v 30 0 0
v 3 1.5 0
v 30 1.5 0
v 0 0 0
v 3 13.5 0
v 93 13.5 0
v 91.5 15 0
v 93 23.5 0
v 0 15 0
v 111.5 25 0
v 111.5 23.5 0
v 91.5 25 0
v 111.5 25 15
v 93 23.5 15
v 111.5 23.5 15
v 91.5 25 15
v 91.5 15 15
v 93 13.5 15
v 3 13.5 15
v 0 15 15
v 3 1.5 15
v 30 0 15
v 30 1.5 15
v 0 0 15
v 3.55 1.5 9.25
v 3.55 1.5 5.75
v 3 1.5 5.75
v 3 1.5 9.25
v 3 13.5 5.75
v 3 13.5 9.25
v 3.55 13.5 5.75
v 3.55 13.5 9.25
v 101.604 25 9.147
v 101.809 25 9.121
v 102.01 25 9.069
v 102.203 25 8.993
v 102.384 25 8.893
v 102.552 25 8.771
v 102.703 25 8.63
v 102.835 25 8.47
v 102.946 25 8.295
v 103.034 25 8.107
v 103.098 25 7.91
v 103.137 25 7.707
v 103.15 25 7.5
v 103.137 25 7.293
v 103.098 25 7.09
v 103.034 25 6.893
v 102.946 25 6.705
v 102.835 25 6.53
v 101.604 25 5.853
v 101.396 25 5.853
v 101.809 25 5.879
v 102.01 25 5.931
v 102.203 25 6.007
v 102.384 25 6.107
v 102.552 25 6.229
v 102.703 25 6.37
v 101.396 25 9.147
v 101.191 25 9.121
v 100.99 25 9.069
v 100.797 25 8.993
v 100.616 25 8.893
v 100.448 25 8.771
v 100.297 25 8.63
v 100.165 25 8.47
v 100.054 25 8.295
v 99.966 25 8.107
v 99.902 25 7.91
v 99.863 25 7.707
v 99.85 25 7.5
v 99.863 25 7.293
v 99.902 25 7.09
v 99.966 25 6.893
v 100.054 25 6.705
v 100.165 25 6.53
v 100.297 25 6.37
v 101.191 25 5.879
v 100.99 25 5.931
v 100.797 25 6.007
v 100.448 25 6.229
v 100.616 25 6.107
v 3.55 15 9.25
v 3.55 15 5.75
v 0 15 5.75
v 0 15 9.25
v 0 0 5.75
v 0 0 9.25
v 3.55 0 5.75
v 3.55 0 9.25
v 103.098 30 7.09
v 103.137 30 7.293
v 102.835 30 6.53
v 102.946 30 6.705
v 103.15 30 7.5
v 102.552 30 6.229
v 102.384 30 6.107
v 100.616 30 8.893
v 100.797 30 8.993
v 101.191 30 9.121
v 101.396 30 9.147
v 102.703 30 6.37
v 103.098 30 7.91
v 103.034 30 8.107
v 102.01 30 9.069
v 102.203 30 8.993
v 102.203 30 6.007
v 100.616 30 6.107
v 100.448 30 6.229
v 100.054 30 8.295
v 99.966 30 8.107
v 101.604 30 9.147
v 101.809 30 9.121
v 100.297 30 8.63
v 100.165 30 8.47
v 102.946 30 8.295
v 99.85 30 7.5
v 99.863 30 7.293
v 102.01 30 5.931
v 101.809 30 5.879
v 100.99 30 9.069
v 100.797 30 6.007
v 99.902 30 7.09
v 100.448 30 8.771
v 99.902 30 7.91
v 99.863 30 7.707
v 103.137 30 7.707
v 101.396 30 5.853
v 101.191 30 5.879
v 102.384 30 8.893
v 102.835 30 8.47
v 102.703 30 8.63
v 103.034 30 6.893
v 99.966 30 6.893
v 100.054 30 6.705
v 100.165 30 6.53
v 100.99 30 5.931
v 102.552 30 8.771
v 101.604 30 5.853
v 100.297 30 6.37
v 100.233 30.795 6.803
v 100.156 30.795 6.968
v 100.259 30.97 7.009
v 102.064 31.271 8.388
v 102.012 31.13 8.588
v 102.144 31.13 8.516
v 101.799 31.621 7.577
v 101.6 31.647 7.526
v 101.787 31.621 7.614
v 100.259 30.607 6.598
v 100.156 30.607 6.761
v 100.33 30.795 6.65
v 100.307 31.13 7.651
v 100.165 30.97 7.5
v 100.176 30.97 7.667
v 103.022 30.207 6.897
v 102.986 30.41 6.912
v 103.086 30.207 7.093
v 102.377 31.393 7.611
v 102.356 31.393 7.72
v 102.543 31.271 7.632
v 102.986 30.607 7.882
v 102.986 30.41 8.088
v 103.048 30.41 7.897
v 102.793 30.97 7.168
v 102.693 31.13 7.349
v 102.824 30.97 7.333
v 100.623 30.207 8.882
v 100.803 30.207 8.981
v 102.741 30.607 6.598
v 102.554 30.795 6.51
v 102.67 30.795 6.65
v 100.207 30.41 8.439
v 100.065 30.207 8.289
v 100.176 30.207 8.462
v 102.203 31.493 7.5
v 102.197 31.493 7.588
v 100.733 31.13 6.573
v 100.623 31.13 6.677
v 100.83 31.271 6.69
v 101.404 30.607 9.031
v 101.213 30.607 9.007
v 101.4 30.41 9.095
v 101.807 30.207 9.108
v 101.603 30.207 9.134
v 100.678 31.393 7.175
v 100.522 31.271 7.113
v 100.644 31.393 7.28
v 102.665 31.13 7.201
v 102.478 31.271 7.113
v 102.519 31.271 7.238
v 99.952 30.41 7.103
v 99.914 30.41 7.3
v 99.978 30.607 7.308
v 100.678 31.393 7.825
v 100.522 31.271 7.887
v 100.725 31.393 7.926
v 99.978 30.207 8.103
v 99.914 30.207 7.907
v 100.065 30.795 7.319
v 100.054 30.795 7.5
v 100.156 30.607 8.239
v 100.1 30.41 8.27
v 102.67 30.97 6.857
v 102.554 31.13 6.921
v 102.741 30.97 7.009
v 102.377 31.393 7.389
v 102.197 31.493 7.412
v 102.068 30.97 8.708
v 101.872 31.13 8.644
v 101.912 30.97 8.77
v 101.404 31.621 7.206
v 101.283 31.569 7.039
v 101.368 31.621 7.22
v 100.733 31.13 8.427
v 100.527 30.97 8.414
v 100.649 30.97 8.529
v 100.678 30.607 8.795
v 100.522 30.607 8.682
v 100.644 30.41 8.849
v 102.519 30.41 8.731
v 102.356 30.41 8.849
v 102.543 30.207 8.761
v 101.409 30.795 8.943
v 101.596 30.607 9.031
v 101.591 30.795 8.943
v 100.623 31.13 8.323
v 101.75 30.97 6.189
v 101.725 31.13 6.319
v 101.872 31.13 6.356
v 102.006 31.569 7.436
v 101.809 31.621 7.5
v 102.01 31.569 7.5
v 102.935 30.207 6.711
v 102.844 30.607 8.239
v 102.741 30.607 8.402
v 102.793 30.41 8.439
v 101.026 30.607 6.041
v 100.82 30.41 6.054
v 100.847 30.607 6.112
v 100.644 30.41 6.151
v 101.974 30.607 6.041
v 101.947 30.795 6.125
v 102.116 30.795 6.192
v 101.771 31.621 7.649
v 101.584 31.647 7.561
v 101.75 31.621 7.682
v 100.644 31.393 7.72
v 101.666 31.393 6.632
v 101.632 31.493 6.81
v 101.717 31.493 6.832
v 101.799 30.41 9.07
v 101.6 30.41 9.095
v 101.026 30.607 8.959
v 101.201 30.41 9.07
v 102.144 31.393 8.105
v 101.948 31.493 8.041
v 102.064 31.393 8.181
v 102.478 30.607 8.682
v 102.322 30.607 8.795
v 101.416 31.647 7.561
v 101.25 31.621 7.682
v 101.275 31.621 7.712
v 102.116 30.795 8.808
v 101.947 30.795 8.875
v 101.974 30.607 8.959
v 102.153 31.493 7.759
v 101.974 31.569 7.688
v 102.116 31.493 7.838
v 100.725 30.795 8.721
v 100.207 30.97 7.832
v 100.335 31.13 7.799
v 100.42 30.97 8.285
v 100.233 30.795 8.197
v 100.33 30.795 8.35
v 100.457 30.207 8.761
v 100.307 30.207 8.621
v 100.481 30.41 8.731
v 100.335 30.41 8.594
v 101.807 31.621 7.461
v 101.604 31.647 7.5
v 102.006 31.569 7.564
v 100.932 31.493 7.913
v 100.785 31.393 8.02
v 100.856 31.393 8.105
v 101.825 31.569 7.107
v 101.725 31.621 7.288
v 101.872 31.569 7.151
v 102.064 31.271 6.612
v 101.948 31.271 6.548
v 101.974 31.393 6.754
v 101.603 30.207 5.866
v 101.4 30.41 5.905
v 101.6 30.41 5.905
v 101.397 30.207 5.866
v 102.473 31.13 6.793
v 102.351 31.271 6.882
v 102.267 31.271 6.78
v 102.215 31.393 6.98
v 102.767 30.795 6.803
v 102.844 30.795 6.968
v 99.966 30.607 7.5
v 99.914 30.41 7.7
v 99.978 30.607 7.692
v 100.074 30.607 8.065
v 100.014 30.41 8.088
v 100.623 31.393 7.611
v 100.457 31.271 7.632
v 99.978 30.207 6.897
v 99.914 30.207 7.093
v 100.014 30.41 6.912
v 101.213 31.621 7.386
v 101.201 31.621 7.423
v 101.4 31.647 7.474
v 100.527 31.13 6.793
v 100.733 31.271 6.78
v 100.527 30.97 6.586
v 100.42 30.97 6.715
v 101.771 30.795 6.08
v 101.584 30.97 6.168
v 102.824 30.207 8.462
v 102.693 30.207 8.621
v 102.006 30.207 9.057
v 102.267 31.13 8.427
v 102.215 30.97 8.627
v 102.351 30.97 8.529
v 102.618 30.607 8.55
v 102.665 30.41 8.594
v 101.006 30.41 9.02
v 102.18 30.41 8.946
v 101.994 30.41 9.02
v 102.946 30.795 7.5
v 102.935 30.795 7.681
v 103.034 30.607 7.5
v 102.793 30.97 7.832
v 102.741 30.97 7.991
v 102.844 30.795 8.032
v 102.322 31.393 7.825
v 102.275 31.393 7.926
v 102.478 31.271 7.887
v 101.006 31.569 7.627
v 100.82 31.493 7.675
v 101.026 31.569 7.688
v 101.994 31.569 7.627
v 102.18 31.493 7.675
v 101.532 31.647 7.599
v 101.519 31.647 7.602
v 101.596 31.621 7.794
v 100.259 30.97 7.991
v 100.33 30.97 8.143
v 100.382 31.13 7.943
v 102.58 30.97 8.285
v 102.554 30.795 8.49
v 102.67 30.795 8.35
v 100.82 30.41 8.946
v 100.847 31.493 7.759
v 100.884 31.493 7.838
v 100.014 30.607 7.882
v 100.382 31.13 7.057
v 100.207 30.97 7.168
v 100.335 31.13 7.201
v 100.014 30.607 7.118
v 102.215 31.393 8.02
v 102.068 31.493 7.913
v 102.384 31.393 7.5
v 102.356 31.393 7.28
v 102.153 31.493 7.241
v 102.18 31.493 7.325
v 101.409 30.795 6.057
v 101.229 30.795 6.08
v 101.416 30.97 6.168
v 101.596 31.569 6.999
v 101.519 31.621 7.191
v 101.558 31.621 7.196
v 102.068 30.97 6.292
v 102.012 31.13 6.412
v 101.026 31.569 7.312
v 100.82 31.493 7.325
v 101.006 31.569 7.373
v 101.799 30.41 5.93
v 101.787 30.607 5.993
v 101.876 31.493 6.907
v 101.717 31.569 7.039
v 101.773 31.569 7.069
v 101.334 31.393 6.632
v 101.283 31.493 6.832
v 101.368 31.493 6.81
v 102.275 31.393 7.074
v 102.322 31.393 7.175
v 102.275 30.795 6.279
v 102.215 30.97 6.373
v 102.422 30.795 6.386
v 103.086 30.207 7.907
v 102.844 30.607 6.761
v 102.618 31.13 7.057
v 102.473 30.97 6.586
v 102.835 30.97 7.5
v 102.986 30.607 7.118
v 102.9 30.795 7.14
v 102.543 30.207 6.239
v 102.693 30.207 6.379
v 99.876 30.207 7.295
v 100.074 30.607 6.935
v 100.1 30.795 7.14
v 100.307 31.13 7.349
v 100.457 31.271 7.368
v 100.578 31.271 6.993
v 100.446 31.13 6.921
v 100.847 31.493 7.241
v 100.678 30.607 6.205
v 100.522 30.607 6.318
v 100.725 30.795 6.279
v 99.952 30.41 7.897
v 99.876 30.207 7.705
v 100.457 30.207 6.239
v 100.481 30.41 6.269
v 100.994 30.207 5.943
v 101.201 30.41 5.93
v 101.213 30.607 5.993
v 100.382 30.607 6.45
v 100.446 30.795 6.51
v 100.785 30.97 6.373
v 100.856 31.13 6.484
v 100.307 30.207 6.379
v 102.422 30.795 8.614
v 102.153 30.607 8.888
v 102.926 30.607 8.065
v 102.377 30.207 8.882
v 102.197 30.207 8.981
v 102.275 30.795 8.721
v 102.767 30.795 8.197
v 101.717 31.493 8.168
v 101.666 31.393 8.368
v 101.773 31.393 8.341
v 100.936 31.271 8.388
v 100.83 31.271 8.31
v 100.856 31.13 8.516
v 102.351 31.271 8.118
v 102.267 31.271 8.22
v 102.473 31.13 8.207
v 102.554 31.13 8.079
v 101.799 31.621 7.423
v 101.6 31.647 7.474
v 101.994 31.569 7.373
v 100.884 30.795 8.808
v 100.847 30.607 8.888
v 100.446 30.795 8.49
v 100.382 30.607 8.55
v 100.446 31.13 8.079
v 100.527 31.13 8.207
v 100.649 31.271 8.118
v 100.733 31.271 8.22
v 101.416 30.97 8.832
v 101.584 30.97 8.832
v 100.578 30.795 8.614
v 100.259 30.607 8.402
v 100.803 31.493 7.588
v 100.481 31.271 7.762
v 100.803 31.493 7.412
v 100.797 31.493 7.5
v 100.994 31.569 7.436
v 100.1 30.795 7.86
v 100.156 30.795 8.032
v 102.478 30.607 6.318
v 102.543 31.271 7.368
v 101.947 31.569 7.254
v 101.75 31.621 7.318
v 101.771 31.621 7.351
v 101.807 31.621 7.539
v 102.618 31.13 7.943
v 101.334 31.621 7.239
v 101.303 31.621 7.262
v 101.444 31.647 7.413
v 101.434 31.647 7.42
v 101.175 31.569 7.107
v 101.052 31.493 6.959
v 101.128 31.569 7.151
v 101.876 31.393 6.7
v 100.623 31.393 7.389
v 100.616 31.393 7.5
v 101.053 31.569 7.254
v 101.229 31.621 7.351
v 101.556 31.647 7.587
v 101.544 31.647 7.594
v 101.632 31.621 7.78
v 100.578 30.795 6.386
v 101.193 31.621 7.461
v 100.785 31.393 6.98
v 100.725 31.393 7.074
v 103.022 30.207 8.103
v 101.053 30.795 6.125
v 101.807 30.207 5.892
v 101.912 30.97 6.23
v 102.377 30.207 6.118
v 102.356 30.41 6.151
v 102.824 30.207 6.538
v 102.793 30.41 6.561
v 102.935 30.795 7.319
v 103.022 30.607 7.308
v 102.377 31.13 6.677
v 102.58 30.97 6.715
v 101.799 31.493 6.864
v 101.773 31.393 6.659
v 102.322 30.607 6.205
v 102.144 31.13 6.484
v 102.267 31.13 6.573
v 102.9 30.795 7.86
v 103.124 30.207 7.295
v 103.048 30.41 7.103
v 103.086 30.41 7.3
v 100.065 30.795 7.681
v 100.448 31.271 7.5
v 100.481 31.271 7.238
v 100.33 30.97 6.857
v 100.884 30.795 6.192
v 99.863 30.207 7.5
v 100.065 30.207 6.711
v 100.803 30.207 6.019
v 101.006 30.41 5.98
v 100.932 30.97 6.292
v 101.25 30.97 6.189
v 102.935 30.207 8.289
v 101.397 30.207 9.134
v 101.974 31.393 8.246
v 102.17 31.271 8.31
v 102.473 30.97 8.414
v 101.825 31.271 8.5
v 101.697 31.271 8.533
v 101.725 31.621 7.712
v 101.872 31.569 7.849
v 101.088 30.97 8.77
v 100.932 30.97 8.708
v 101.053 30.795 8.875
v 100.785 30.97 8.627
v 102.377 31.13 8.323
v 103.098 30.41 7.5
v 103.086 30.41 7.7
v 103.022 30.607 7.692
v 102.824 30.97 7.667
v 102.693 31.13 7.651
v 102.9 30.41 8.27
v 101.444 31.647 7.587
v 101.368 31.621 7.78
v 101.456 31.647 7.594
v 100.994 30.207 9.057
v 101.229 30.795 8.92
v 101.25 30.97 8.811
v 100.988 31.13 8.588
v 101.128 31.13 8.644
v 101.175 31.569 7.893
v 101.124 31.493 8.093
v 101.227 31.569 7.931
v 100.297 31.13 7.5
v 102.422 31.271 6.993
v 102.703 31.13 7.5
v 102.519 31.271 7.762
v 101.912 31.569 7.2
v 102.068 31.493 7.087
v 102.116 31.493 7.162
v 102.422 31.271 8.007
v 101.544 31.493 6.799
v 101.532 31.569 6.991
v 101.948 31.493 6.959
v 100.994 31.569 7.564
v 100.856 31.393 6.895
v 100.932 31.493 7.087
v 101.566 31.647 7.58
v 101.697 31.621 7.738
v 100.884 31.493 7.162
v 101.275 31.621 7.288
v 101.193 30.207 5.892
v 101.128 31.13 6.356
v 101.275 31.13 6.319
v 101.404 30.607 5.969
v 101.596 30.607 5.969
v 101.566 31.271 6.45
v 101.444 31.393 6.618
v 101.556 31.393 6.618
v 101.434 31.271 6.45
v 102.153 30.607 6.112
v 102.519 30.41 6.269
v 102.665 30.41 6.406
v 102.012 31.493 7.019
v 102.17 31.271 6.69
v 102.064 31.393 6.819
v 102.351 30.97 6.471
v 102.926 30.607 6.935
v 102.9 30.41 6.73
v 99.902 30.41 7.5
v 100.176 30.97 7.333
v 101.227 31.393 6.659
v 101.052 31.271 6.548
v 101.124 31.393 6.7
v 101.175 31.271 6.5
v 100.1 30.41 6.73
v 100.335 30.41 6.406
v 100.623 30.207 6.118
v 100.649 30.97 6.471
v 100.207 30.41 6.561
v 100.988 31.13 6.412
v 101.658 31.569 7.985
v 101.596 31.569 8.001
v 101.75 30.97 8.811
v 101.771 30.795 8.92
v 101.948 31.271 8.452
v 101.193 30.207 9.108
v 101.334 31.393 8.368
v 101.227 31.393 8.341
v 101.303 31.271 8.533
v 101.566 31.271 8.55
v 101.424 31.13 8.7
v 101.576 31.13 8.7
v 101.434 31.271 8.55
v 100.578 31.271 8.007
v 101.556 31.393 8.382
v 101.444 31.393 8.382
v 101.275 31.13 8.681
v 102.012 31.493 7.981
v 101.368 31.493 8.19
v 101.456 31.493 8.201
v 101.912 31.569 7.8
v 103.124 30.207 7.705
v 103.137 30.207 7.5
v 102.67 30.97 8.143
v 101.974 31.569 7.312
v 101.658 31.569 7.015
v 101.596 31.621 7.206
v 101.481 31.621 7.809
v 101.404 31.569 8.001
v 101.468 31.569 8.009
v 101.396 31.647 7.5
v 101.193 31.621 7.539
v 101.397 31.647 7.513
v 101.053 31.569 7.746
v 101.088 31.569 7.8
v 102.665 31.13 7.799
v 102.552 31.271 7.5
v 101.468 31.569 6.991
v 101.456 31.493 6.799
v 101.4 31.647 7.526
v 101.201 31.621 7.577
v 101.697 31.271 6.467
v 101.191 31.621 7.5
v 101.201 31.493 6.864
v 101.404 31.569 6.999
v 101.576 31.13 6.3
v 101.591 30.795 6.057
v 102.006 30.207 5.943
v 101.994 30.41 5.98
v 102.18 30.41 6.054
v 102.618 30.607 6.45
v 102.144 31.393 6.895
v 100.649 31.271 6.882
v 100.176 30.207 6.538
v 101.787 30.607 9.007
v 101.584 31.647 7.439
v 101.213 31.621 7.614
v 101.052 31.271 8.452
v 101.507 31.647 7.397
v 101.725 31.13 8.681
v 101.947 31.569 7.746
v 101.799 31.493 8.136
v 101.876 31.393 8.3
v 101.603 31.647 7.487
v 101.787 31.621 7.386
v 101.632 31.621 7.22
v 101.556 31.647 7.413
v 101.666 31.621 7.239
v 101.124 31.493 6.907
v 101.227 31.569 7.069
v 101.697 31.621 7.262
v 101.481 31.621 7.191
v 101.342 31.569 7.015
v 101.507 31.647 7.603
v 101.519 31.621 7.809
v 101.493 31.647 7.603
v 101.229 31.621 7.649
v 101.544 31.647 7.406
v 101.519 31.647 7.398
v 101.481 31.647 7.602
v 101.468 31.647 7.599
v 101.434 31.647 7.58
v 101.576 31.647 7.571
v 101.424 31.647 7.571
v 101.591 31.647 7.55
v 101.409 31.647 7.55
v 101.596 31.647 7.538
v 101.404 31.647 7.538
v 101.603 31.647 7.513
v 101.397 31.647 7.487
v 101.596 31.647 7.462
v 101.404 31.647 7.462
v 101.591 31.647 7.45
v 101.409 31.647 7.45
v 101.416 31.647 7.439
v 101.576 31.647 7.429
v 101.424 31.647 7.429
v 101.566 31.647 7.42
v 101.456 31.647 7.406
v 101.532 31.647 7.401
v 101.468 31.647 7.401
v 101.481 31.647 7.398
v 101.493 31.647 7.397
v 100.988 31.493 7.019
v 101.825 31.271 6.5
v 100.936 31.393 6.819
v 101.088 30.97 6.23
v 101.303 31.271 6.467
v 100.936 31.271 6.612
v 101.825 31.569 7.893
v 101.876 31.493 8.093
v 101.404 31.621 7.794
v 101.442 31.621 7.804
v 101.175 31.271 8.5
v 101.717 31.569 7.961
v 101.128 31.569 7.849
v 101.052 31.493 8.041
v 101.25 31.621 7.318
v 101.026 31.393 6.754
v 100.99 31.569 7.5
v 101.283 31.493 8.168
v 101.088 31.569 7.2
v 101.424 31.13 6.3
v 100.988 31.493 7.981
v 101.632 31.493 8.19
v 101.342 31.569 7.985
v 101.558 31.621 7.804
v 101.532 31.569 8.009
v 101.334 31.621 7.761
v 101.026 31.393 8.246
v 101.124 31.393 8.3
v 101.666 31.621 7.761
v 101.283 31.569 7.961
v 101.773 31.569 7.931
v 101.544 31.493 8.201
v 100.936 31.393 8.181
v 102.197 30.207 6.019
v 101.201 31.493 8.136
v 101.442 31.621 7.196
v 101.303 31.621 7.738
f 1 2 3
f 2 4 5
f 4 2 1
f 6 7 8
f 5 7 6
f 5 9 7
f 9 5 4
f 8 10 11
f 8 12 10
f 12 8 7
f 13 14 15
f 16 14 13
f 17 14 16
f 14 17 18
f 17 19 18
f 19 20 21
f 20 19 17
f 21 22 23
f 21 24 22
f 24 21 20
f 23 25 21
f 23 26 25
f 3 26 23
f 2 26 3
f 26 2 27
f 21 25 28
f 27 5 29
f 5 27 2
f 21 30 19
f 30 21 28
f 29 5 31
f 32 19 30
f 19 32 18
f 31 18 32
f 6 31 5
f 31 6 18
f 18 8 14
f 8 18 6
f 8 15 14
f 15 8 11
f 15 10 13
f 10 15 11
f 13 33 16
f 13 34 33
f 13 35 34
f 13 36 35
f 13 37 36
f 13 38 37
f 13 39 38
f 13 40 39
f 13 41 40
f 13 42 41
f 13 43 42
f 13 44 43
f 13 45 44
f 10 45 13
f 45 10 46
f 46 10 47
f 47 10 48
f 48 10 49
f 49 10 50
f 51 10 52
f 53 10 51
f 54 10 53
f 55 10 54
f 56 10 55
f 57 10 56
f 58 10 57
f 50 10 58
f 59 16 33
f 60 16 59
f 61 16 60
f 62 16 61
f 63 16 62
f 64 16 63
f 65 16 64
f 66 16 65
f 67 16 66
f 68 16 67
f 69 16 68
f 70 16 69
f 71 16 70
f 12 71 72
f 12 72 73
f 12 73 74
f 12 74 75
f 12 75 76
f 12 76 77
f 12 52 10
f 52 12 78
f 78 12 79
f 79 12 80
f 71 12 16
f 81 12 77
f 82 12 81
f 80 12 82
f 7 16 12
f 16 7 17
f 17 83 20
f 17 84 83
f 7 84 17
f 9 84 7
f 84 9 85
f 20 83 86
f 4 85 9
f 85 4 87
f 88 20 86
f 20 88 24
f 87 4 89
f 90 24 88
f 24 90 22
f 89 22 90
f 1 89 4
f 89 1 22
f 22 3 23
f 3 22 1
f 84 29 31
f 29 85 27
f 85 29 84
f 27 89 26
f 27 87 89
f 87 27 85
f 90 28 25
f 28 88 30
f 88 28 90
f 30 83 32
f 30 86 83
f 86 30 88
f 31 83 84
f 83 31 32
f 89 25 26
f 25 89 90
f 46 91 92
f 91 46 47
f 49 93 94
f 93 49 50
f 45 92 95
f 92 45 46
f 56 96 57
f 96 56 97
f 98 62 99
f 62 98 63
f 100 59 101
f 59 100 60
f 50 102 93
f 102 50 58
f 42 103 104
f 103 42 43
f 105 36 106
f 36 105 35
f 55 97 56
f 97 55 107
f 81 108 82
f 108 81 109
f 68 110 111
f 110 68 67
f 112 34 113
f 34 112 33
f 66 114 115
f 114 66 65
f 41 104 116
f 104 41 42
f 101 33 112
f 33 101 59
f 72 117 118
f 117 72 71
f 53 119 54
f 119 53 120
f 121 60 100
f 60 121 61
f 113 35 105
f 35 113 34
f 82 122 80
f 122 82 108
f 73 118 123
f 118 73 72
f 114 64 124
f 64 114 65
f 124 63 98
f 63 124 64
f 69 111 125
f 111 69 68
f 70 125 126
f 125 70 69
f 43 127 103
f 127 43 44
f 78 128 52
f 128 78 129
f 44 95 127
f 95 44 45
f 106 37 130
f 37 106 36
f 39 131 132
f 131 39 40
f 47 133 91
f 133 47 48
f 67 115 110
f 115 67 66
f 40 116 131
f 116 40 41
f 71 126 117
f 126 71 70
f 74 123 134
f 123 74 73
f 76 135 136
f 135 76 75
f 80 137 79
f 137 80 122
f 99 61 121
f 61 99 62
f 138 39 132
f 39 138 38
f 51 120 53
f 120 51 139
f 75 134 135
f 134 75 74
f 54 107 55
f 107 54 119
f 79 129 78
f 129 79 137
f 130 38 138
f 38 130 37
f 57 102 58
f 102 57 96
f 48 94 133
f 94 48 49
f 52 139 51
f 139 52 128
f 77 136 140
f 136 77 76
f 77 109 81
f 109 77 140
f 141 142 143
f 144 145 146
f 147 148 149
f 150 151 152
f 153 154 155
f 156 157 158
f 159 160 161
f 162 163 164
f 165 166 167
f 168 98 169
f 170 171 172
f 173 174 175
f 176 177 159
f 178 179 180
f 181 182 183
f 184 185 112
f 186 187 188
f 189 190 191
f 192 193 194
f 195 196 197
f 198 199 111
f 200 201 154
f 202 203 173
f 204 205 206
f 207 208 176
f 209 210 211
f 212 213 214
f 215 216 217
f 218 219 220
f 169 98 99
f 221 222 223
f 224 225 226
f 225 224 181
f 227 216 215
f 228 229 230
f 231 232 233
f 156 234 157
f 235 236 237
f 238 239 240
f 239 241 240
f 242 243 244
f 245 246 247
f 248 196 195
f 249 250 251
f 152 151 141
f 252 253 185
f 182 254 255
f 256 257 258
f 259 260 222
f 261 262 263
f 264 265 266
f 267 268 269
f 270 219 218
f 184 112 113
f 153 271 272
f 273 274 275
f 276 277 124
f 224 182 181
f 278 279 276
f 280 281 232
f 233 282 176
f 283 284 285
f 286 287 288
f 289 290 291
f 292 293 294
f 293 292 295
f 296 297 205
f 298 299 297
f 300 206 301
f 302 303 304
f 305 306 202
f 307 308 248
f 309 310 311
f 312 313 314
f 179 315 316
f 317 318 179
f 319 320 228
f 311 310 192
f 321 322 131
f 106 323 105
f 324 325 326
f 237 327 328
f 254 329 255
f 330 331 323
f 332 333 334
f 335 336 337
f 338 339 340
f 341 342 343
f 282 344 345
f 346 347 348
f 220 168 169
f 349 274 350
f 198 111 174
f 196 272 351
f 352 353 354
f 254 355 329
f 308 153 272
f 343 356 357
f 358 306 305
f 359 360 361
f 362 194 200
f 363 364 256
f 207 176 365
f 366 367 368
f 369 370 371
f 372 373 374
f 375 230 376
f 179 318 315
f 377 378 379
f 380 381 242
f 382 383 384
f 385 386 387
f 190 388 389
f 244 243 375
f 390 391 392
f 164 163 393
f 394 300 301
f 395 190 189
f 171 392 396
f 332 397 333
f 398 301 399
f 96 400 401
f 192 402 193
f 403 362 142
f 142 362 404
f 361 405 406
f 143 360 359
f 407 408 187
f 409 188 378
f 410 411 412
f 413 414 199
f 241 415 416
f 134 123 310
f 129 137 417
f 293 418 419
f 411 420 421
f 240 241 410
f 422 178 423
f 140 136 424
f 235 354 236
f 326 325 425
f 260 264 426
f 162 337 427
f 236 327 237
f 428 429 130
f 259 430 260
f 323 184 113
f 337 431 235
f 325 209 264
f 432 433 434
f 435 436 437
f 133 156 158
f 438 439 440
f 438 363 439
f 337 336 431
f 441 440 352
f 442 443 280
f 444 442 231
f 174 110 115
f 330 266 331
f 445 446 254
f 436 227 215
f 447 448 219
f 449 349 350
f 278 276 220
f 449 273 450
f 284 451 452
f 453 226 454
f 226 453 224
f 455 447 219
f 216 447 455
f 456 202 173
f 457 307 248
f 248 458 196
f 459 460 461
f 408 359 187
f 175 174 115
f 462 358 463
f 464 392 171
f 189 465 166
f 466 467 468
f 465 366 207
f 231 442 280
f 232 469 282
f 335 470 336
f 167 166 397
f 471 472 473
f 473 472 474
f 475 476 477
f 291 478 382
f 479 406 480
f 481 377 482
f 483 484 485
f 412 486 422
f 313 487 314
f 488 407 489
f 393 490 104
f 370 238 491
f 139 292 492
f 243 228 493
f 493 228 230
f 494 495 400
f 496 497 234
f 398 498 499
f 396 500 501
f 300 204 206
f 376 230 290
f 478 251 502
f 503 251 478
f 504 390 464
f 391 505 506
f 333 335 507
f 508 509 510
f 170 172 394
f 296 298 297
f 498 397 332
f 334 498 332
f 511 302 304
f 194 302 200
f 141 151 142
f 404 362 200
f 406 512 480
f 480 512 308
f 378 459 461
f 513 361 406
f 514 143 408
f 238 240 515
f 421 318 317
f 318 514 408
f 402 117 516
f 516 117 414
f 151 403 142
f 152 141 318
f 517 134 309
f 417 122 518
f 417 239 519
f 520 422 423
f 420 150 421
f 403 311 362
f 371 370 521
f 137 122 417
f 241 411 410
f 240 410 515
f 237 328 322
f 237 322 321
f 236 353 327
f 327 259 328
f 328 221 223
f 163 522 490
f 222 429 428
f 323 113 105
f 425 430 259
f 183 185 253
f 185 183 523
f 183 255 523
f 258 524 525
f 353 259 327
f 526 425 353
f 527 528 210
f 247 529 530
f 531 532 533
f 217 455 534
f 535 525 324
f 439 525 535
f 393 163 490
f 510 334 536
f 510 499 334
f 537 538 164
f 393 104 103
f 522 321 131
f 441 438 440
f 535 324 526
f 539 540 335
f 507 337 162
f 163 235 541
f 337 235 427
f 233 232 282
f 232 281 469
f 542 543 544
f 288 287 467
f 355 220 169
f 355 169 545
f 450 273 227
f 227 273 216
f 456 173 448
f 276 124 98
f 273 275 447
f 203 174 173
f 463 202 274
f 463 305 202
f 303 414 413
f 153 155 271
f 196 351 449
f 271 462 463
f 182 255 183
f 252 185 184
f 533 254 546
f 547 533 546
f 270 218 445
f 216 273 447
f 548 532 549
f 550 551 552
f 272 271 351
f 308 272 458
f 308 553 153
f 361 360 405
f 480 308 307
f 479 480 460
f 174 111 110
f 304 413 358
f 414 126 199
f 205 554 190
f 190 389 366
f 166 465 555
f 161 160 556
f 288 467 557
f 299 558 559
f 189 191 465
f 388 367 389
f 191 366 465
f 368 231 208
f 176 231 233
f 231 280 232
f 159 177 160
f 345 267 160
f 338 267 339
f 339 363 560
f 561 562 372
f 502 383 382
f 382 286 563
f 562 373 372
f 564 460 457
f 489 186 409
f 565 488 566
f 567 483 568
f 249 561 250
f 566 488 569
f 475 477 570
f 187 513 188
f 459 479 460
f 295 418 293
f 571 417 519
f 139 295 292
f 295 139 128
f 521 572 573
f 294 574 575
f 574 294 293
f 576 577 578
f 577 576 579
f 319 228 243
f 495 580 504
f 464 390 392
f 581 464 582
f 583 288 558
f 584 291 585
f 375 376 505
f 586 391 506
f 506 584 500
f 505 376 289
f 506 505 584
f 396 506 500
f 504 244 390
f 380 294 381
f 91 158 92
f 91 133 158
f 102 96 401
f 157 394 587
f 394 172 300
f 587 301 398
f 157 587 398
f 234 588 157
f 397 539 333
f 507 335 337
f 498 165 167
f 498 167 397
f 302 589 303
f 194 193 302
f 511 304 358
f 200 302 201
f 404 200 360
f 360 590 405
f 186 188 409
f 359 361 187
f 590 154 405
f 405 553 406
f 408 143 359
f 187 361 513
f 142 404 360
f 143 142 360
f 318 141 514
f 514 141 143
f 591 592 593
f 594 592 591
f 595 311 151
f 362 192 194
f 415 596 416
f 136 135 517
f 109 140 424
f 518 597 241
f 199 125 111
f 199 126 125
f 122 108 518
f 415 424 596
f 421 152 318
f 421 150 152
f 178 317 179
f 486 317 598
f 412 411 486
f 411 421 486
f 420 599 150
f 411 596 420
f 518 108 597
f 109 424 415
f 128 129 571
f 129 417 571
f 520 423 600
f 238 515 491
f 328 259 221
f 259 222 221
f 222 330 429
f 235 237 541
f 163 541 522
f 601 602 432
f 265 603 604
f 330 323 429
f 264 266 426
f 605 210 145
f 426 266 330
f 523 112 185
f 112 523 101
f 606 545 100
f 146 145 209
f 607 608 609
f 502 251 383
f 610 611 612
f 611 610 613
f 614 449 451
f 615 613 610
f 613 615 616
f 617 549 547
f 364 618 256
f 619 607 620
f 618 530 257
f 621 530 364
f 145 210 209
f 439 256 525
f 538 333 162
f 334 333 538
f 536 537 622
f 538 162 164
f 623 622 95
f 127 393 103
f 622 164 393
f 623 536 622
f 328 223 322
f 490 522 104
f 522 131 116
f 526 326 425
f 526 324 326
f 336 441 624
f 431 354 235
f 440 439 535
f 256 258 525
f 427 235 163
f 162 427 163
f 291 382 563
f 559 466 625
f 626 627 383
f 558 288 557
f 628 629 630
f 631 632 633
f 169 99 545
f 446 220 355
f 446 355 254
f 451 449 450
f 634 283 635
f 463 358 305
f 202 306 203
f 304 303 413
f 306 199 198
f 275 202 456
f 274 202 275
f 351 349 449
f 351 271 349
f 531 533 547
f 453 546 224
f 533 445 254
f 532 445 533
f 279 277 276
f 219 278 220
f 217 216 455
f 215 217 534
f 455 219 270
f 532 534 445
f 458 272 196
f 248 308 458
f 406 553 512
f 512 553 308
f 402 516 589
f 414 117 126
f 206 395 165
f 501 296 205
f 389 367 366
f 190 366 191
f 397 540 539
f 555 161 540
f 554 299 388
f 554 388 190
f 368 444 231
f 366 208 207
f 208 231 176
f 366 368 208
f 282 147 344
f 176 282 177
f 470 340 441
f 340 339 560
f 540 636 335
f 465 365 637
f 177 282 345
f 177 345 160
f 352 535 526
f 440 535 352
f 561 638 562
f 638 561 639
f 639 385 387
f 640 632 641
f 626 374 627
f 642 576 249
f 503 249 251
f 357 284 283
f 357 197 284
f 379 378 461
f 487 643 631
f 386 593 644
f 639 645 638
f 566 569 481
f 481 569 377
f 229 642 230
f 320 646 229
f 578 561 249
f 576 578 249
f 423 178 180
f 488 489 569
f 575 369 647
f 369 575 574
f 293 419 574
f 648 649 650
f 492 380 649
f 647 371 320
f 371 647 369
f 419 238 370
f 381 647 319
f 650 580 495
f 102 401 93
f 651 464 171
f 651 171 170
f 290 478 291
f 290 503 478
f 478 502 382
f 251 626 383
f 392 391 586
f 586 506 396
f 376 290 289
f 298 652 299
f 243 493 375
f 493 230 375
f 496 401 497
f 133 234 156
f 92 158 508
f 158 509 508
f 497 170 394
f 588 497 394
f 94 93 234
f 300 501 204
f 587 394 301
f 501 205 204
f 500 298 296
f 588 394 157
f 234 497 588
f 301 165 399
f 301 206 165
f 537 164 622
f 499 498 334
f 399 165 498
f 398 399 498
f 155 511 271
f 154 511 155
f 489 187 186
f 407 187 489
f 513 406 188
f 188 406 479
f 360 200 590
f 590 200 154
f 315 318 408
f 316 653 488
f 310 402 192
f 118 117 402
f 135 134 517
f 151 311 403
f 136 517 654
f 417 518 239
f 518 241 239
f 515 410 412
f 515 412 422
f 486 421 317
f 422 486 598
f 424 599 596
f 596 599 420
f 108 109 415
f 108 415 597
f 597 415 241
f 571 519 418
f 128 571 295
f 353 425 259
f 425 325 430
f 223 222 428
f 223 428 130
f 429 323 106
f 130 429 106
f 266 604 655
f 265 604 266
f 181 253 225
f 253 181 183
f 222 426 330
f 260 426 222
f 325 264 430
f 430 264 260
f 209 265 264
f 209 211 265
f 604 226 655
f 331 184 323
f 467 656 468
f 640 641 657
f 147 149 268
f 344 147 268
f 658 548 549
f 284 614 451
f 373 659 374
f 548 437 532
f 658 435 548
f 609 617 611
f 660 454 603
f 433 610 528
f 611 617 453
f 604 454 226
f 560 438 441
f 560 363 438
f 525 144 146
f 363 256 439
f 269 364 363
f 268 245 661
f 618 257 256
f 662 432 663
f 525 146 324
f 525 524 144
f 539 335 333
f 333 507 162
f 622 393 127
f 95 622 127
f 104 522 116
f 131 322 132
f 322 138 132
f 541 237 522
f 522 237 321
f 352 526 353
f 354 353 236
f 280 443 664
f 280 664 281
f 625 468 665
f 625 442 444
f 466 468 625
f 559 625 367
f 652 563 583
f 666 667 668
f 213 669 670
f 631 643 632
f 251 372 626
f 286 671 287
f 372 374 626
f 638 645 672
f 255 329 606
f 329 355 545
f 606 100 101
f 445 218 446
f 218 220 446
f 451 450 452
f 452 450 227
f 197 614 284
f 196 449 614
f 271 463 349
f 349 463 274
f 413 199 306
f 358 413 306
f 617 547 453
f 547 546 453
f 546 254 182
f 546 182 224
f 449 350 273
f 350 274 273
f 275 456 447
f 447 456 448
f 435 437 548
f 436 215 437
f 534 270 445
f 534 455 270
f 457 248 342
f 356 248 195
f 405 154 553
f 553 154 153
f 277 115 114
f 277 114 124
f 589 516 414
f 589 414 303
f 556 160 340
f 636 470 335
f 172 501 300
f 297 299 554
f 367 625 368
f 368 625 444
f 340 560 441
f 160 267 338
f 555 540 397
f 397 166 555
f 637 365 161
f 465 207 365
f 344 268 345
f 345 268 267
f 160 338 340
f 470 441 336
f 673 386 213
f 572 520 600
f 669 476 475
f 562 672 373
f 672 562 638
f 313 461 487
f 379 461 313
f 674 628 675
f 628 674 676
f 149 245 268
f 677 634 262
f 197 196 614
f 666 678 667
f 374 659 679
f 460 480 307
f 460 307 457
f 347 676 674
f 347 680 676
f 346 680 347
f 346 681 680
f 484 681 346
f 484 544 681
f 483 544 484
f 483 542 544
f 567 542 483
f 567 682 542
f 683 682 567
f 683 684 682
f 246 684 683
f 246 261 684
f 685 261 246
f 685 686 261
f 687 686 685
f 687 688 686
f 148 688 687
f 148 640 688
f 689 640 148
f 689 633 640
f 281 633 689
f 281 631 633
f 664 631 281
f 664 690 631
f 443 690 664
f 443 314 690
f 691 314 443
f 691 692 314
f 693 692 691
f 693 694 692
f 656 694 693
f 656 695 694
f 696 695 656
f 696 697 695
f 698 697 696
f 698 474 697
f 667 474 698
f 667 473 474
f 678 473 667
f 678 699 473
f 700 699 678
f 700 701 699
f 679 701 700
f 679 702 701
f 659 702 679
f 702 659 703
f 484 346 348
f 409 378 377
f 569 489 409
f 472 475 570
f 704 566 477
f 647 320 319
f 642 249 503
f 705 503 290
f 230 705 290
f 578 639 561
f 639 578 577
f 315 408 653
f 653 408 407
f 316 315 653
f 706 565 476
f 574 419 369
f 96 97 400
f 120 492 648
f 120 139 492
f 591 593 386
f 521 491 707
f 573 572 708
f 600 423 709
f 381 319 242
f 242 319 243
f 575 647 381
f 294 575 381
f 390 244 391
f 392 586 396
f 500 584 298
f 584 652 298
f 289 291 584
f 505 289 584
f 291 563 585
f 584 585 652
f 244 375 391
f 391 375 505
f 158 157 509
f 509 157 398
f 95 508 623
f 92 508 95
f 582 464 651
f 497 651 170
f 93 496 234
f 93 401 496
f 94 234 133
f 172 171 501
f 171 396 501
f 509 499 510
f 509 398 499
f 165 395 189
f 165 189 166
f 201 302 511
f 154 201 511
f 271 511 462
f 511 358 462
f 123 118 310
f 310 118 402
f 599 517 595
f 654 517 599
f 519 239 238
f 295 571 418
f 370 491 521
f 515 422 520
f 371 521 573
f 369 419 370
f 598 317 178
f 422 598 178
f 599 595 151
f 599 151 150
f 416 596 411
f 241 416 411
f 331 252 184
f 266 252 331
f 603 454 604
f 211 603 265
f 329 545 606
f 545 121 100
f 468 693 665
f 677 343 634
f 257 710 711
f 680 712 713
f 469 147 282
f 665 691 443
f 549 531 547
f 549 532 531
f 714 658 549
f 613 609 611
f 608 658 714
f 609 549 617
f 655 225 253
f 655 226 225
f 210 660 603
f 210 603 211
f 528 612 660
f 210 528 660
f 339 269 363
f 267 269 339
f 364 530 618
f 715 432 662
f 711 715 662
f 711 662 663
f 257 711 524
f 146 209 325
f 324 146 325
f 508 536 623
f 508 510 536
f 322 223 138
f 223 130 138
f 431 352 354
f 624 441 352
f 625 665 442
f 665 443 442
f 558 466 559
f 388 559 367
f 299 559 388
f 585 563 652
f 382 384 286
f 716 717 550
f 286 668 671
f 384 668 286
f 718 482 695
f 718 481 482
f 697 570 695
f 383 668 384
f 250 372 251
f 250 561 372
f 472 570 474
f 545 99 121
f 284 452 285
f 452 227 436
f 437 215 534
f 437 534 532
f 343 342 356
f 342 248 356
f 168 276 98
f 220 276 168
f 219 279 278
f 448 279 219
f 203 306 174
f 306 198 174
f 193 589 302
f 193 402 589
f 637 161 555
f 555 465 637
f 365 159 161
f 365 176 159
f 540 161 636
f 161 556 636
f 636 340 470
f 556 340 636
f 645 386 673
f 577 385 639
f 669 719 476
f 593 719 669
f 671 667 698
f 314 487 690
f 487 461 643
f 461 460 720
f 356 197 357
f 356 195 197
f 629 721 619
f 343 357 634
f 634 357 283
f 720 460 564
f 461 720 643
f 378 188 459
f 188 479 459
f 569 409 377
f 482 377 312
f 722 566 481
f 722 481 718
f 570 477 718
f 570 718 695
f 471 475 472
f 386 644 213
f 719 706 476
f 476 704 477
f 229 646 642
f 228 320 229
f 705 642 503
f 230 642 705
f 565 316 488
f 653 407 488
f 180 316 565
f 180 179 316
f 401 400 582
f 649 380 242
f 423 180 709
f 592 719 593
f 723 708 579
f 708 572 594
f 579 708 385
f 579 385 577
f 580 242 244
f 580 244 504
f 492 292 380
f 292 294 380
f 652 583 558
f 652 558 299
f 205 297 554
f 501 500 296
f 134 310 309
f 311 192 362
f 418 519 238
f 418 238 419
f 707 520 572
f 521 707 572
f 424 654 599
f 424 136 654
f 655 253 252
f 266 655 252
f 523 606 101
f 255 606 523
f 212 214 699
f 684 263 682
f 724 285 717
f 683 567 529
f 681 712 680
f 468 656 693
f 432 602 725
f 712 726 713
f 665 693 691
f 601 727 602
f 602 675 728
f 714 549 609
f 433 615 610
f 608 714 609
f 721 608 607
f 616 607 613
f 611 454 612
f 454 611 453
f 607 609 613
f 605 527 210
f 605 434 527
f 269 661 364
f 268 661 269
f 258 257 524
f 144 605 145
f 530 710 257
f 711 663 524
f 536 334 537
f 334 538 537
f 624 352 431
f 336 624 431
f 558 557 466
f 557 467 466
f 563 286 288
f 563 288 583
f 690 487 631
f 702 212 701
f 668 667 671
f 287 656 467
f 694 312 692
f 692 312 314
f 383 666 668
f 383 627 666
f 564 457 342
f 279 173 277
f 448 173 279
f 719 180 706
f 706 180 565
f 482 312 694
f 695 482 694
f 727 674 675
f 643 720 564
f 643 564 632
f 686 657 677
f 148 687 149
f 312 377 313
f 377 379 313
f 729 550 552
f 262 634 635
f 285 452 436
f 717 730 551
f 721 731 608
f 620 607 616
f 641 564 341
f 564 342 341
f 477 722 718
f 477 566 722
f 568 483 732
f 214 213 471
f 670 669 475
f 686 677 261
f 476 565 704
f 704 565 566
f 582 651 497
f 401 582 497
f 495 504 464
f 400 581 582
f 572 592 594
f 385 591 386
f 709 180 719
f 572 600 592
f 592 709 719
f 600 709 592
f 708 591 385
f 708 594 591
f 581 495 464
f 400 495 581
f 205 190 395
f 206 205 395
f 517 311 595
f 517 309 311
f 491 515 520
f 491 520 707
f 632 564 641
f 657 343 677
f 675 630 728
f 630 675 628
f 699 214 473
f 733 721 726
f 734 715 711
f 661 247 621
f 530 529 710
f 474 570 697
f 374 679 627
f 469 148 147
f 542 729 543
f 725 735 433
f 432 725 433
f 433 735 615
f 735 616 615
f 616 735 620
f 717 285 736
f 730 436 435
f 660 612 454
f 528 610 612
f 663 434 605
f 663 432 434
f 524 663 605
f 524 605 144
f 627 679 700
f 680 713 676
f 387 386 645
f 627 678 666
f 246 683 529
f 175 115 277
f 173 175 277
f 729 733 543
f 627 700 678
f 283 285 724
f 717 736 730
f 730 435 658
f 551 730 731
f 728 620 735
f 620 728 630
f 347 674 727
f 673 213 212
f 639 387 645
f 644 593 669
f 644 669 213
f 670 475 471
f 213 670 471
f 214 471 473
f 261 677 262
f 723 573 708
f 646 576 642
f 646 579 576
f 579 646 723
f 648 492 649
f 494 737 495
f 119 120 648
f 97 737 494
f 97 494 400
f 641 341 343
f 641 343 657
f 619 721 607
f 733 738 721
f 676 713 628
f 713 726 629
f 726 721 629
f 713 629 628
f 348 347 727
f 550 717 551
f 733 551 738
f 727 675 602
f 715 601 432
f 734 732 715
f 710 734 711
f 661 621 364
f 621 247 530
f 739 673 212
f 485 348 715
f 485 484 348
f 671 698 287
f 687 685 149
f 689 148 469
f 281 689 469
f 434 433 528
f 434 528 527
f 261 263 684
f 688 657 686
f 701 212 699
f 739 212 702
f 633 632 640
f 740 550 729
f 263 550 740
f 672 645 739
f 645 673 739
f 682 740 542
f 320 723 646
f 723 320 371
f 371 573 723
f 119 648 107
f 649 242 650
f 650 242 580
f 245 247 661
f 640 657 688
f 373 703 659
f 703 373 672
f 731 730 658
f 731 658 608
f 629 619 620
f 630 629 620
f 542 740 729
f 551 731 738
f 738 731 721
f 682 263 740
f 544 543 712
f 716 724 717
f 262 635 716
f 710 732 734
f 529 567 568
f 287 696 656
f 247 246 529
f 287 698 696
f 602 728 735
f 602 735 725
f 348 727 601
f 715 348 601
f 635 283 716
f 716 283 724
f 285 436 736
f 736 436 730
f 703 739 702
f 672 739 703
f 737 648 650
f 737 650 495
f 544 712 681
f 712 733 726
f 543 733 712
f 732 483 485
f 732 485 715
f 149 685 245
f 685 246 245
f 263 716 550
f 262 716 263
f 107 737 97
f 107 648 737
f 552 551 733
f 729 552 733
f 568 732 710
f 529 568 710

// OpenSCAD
$fn=50;
eps=.1;
thikness=1.5;
vaseWallThikness=12;
waterLevelDepth=90;
probeHeight=20;
cableD=3.5;
holderWidth=15;
pinD=3.3;
pinDepth=5;

holderP=[
    [0,0],
    [30,0],
    [30,thikness],
    [3,thikness],
    [3,thikness+vaseWallThikness],
    [3+waterLevelDepth,thikness+vaseWallThikness],
    [3+waterLevelDepth,thikness+vaseWallThikness+10],
    [3+waterLevelDepth+probeHeight-thikness,thikness+vaseWallThikness+10],
    [3+waterLevelDepth+probeHeight-thikness,thikness+vaseWallThikness+10+thikness],
    [3+waterLevelDepth-thikness,thikness+vaseWallThikness+10+thikness],
    [3+waterLevelDepth-thikness,thikness+vaseWallThikness+thikness],
    [0,thikness+vaseWallThikness+thikness]
];

difference() {
    linear_extrude(holderWidth) polygon(holderP);
    translate([-eps/2,-eps/2,(holderWidth-cableD)/2]) 
        linear_extrude(cableD) square([cableD+eps, eps+2*thikness+vaseWallThikness]);
}

translate([3+waterLevelDepth+probeHeight-thikness-probeHeight/2,2*thikness+vaseWallThikness+10,holderWidth/2]) rotate([-90,0,0]) pin();


module pin() {
    linear_extrude(pinDepth) circle(pinD/2);
    translate([0,0,pinDepth]) sphere(pinD/2);
}
